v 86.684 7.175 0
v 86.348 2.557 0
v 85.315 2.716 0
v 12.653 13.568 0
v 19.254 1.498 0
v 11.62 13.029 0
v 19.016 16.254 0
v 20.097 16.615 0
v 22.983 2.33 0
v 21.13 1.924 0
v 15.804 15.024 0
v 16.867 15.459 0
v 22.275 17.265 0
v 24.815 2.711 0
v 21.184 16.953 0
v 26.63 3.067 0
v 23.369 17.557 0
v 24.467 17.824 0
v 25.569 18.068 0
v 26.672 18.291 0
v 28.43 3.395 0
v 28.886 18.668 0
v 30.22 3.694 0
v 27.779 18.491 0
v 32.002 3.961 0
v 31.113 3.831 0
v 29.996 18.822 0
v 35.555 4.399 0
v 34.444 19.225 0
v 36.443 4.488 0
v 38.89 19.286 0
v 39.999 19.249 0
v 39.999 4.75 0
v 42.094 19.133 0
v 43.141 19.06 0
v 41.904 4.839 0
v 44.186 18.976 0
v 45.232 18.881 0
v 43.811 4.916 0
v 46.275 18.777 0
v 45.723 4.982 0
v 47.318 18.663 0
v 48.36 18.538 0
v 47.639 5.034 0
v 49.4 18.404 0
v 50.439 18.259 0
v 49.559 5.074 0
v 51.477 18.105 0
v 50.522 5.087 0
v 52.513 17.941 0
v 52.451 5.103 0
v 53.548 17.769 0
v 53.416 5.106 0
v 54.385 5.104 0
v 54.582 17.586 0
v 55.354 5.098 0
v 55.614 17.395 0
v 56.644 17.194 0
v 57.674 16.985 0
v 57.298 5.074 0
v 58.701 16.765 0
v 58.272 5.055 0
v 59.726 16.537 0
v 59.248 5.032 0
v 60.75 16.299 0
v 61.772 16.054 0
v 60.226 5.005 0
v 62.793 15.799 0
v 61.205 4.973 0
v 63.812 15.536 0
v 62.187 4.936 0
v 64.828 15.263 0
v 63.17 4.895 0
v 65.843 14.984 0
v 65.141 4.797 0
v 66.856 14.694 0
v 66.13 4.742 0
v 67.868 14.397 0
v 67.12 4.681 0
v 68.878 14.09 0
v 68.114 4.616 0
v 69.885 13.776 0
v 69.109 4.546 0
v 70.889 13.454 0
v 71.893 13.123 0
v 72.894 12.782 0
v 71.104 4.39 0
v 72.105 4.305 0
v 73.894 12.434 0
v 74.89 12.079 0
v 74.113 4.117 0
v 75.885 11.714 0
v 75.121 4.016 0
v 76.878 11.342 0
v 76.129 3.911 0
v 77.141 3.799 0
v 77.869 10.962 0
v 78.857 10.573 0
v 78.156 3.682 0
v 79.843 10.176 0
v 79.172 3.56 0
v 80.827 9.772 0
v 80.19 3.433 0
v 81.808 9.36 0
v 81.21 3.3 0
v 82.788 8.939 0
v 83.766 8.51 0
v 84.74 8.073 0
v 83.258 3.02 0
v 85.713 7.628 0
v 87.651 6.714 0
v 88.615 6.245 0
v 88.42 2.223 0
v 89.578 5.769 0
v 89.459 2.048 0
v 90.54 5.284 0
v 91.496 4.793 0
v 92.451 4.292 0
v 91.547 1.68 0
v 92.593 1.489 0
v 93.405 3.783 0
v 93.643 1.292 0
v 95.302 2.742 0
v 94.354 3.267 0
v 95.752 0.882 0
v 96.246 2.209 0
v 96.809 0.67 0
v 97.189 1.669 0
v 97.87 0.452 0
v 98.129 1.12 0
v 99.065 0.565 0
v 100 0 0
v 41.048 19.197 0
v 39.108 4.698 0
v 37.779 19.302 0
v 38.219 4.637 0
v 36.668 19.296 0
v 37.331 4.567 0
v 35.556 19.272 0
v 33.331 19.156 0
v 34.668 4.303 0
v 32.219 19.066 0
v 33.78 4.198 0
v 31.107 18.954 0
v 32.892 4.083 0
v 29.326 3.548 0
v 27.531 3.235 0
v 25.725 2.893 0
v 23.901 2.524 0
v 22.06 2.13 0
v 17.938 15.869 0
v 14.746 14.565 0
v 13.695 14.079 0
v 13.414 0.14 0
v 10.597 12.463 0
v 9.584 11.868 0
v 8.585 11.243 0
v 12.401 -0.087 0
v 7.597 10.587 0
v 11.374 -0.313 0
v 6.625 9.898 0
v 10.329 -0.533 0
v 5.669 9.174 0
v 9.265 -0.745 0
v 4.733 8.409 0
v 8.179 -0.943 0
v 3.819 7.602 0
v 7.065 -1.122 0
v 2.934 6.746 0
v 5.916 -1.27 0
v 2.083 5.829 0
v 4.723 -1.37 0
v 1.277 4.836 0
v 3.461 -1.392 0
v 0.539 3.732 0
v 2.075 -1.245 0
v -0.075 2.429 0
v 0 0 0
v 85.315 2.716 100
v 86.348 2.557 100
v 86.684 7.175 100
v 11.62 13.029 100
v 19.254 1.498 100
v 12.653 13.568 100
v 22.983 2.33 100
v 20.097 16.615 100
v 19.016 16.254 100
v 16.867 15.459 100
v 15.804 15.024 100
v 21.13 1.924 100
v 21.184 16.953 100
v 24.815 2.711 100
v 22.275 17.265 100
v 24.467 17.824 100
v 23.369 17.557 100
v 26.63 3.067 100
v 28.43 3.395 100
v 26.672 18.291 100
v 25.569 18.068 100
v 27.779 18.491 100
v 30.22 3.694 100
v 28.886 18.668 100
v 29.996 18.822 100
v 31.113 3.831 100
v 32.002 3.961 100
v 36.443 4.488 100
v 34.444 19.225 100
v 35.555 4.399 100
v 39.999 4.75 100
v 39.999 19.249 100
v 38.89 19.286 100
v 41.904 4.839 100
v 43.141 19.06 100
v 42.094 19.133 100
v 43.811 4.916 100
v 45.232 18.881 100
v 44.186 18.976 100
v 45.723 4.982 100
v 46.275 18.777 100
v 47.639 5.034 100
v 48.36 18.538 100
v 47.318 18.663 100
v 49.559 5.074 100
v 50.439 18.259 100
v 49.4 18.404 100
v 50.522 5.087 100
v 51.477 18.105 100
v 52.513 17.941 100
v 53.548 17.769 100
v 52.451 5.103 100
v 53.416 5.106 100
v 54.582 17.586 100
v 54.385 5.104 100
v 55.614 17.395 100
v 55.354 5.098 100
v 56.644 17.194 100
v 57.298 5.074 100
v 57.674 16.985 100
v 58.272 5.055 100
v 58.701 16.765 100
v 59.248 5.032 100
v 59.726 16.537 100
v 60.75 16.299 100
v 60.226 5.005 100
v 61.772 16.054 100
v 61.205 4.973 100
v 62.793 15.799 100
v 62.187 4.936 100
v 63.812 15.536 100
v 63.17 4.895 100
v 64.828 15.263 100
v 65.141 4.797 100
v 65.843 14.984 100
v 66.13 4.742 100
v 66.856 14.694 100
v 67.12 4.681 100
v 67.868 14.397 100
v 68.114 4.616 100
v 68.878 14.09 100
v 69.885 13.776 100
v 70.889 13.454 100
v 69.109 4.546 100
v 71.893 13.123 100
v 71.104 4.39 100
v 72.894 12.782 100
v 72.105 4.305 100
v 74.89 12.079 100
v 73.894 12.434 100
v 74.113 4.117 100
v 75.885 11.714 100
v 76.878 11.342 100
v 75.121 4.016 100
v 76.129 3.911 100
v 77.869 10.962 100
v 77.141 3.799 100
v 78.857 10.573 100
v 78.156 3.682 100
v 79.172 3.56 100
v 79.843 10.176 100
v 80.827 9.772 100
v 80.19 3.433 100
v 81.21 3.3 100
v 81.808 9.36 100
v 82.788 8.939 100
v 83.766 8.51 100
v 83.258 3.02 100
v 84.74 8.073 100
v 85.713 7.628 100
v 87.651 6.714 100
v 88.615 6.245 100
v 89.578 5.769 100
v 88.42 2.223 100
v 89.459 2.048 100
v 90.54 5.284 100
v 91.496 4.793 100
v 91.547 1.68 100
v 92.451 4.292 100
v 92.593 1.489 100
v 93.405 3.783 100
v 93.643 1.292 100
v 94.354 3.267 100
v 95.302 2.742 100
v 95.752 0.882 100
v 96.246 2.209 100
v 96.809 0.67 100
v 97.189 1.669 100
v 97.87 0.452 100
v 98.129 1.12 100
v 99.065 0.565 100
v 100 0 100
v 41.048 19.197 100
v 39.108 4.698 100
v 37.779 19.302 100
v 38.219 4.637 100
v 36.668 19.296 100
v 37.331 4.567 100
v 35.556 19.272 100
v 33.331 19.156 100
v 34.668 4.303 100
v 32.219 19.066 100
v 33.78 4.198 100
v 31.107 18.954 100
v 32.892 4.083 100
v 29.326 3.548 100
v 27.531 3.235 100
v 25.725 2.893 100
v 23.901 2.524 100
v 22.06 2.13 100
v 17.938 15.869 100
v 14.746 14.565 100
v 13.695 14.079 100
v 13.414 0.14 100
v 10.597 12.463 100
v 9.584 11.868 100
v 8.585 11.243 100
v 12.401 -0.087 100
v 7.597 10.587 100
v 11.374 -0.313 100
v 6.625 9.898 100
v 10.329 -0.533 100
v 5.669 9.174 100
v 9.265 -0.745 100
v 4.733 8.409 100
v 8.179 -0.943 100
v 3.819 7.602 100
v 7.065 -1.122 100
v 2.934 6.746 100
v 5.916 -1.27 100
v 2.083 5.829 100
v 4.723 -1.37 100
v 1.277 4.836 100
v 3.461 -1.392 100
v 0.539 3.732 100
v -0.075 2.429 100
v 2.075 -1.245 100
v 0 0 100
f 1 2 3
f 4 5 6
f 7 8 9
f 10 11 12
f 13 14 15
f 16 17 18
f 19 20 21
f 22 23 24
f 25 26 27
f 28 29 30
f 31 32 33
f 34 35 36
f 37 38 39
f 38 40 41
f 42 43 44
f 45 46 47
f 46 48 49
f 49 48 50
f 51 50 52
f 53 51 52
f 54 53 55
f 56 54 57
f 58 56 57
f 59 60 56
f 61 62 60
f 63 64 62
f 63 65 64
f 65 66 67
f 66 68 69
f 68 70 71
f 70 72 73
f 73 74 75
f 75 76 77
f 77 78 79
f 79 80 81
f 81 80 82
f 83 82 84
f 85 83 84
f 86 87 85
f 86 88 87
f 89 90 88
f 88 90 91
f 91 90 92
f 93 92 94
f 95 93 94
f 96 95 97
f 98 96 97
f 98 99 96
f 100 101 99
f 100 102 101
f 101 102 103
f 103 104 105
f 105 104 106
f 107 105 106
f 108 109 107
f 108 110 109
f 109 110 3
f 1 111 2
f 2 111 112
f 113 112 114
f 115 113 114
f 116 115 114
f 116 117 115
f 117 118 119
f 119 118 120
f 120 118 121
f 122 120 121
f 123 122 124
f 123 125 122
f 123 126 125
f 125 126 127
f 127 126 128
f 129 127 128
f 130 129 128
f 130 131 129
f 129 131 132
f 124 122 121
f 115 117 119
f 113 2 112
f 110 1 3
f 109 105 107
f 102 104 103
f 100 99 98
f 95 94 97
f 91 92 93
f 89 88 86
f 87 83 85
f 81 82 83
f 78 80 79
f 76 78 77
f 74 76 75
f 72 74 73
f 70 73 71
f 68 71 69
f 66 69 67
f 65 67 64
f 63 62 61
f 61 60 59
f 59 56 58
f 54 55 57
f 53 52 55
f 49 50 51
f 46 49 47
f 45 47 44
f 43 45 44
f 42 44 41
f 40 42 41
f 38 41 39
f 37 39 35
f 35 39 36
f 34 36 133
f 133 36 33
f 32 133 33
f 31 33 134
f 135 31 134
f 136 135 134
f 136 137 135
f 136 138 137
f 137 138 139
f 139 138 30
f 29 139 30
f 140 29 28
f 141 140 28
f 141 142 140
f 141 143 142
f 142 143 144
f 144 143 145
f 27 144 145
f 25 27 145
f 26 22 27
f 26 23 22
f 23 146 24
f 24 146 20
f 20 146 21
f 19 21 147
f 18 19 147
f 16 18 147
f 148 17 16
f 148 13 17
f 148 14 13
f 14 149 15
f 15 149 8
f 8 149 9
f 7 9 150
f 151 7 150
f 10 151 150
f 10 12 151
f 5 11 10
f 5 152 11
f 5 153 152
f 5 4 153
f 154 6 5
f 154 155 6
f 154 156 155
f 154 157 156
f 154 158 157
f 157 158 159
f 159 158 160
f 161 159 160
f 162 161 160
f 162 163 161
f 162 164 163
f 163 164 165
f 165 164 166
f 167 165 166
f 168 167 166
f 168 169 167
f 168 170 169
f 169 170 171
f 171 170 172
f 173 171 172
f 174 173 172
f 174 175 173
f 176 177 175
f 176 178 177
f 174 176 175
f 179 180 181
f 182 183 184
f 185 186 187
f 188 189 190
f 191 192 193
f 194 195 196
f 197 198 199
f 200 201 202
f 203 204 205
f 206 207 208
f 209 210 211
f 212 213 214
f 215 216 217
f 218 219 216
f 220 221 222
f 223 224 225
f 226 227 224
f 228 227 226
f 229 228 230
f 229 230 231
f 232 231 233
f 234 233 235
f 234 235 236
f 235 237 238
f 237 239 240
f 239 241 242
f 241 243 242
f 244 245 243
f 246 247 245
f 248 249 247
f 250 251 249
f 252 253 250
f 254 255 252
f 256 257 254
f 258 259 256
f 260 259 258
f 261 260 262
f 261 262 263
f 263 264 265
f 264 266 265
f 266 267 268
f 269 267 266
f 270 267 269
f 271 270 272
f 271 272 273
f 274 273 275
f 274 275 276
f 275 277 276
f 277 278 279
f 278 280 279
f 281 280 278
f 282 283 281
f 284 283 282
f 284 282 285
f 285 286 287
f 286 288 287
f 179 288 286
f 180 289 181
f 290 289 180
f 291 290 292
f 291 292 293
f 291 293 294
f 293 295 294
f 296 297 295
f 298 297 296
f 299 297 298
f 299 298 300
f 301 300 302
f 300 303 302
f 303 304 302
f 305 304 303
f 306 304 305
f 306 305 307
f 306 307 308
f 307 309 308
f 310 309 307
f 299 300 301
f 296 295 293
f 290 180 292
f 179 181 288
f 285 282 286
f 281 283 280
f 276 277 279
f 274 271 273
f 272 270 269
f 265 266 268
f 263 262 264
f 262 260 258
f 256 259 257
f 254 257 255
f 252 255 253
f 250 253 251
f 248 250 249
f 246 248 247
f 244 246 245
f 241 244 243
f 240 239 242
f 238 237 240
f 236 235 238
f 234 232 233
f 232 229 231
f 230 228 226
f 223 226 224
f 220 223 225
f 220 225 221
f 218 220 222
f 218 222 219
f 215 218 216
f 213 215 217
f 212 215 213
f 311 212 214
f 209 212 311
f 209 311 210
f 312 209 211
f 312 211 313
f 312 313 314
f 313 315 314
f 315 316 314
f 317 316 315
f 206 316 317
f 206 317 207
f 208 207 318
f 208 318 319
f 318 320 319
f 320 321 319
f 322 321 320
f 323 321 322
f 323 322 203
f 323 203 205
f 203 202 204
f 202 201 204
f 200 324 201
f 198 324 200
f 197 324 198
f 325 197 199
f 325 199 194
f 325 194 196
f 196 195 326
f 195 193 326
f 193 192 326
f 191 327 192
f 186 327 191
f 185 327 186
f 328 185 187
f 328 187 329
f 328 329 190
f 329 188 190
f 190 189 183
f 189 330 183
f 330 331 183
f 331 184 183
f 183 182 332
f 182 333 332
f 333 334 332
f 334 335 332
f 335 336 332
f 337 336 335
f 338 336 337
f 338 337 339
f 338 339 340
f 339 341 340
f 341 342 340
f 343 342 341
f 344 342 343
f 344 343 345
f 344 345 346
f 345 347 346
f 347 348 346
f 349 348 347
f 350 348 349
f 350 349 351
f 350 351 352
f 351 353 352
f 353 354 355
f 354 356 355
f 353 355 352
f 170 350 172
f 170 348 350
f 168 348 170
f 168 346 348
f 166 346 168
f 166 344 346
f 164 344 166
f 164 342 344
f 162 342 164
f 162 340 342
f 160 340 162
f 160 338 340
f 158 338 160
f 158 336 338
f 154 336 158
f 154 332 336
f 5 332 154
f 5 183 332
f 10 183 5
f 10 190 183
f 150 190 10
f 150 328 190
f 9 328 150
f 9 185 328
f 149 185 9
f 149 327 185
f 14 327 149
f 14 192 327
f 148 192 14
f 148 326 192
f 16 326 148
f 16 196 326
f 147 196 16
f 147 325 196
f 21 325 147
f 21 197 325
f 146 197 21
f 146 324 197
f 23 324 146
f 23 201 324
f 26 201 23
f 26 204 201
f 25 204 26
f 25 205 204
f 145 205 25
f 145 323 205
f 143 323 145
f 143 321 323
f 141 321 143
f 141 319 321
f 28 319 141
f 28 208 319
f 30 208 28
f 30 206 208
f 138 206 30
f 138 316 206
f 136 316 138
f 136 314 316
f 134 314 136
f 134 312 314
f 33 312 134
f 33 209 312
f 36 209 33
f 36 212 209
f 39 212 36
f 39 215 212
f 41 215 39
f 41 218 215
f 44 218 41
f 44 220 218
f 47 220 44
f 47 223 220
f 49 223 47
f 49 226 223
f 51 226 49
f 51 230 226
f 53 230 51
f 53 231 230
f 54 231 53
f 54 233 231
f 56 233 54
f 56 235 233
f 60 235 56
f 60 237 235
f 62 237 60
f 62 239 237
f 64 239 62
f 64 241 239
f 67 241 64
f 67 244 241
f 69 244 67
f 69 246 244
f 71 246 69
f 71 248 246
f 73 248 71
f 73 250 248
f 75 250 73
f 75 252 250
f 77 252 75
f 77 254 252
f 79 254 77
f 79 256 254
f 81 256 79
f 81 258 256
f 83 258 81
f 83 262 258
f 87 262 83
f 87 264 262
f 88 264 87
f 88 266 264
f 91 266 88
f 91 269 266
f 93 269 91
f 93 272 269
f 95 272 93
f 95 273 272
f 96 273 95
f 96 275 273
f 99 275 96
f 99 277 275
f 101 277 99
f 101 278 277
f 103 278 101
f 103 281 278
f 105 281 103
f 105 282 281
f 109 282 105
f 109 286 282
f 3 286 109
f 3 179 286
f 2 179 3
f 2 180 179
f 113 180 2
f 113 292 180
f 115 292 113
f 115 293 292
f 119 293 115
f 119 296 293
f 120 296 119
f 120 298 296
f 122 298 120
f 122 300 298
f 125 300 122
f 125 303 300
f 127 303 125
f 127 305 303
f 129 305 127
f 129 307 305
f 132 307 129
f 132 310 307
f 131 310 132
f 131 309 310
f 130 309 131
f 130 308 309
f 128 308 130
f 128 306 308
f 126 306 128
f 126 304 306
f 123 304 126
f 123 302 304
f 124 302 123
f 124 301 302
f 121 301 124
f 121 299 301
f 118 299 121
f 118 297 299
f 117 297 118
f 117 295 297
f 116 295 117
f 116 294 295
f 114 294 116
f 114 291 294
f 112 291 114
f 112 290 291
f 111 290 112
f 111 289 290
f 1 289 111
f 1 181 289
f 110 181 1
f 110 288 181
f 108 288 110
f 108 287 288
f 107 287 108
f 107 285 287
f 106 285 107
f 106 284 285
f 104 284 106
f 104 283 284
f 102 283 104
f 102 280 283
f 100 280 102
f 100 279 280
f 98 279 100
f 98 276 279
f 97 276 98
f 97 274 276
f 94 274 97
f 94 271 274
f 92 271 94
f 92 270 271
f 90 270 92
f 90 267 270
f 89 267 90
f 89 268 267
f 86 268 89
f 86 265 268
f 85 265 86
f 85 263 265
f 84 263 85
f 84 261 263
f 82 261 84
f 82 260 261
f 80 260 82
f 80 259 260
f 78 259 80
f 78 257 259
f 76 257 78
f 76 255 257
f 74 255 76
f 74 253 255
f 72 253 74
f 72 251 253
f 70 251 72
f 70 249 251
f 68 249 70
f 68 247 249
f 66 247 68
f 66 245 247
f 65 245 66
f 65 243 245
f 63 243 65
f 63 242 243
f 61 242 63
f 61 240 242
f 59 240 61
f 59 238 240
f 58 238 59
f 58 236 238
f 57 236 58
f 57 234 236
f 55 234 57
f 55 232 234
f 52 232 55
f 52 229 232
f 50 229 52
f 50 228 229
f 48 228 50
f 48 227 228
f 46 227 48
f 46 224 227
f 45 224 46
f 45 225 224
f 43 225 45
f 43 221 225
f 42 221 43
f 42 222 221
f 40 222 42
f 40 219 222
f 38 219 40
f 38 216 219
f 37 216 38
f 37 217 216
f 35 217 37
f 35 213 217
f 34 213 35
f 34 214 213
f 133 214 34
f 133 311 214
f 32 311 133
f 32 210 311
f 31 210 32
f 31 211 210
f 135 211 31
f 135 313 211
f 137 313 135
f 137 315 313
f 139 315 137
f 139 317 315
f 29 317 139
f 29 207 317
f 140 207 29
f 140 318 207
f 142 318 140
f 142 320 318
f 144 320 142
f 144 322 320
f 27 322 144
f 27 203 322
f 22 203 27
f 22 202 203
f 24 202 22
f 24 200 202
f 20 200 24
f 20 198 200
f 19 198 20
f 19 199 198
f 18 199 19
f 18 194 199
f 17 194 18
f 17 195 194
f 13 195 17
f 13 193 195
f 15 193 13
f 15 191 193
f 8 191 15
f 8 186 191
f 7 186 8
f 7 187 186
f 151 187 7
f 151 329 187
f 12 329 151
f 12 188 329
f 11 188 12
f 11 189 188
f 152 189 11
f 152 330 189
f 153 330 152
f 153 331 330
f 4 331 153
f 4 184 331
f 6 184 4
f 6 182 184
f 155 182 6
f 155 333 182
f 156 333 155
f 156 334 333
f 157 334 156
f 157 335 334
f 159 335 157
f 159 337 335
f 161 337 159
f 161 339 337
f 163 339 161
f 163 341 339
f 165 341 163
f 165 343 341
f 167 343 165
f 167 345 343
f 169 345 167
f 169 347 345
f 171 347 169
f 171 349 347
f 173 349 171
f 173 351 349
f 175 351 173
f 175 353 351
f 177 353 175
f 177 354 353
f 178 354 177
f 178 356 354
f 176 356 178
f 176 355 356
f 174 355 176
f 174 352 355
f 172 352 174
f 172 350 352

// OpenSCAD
LEA=30; // Leading Edge Angle
LER=10; // Leading Edge Radius
MT=14; // Maximum Thickness
MTD=10; // Maximum Thickness Distance
TEA=-15; // Trailing Edge Angle

/*
rotate([0,0,LEA])
translate([LER,0])
circle(10);
*/

//square([100,1]);

module NACA_Four_Demo(C,CD,T,S){
    t=0.15;
    c=0.05;
    cd=0.35;
    s=1;
    
    for (xp=[0:99]){
        x=xp/100;
       // translate([xp,0])
      // square([1,xp]);
        
    Yt=(5*t*(0.2969*sqrt(x)-0.1260*x-0.3516*pow(x,2)+0.2843*pow(x,3)-(s?0.1015:0.1036)*pow(x,4))<=0)?0.00001:5*t*(0.2969*sqrt(x)-0.1260*x-0.3516*pow(x,2)+0.2843*pow(x,3)-(s?0.1036:0.1015)*pow(x,4));
        
        Yc=(x<cd)?((c)/pow(cd,2))*(2*cd*x-pow(x,2)):(c)/pow((1-cd),2)*((1-2*cd)+2*cd*x-pow(x,2));
        
        der=(x<cd)?2*c/pow(cd,2)*(cd-x):(2*c)/pow((1-cd),2)*(cd-x);
        
        theta=atan(der);
    
        translate([xp,((-Yt*100*2)/2)])
        square([1,Yt*100*2]);
        
        translate([xp,40+Yc*100])
        square([1,1]);
        
        translate([xp,20])
        rotate([0,0,theta])
        translate([0,-10])
        square([0.2,20]);
 
        translate([0,Yc*100+80])
        translate([xp,0])
        rotate([0,0,theta])
        translate([0,-Yt*100,0])
        square([1,Yt*100*2]);
        
    }
    
}

//NACA_Four_Demo(0,0,0);

function naca_four(m,p,t,s,f,i=0,result=[])=
let (
    edge=1/f/2/2,
    odd=(f%2==1)?edge:0,
    low=i<(f/2),
    x=(((i==0 || i==(f-1)) && odd)?edge:(odd && i==((f-1)/2))?0.25:low?i/f/2:0.5-(odd?edge:0)-i/f/2)*4,
    coef=s?0.1036:0.1015,
    Yt=(5*t*(0.2969*sqrt(x)-0.1260*x-0.3516*(x*x)+0.2843*(x*x*x)-coef*(x*x*x*x))),
    Yc=(x<p)?((m)/(p*p)*(2*p*x-(x*x))):(m)/((1-p)*(1-p))*((1-2*p)+2*p*x-(x*x)),
    drv=(x<p)?2*m/(p*p)*(p-x):(2*m)/((1-p)*(1-p))*(p-x),
    theta=atan(drv),
sxl=x+Yt*sin(theta),
sxu=x-Yt*sin(theta),
syl=Yc-Yt*cos(theta),
syu=Yc+Yt*cos(theta),
    sx=(low)?sxl:sxu,
    sy=(low)?syl:syu
)
(i<f)?naca_four(m,p,t,s,f,i+1,concat(result,[[sx,sy]])):result;


airfoil=naca_four(0.12,0.4,0.15,1,200);
linear_extrude(100,convexity=10)
scale([100,100])
polygon(points=airfoil);
